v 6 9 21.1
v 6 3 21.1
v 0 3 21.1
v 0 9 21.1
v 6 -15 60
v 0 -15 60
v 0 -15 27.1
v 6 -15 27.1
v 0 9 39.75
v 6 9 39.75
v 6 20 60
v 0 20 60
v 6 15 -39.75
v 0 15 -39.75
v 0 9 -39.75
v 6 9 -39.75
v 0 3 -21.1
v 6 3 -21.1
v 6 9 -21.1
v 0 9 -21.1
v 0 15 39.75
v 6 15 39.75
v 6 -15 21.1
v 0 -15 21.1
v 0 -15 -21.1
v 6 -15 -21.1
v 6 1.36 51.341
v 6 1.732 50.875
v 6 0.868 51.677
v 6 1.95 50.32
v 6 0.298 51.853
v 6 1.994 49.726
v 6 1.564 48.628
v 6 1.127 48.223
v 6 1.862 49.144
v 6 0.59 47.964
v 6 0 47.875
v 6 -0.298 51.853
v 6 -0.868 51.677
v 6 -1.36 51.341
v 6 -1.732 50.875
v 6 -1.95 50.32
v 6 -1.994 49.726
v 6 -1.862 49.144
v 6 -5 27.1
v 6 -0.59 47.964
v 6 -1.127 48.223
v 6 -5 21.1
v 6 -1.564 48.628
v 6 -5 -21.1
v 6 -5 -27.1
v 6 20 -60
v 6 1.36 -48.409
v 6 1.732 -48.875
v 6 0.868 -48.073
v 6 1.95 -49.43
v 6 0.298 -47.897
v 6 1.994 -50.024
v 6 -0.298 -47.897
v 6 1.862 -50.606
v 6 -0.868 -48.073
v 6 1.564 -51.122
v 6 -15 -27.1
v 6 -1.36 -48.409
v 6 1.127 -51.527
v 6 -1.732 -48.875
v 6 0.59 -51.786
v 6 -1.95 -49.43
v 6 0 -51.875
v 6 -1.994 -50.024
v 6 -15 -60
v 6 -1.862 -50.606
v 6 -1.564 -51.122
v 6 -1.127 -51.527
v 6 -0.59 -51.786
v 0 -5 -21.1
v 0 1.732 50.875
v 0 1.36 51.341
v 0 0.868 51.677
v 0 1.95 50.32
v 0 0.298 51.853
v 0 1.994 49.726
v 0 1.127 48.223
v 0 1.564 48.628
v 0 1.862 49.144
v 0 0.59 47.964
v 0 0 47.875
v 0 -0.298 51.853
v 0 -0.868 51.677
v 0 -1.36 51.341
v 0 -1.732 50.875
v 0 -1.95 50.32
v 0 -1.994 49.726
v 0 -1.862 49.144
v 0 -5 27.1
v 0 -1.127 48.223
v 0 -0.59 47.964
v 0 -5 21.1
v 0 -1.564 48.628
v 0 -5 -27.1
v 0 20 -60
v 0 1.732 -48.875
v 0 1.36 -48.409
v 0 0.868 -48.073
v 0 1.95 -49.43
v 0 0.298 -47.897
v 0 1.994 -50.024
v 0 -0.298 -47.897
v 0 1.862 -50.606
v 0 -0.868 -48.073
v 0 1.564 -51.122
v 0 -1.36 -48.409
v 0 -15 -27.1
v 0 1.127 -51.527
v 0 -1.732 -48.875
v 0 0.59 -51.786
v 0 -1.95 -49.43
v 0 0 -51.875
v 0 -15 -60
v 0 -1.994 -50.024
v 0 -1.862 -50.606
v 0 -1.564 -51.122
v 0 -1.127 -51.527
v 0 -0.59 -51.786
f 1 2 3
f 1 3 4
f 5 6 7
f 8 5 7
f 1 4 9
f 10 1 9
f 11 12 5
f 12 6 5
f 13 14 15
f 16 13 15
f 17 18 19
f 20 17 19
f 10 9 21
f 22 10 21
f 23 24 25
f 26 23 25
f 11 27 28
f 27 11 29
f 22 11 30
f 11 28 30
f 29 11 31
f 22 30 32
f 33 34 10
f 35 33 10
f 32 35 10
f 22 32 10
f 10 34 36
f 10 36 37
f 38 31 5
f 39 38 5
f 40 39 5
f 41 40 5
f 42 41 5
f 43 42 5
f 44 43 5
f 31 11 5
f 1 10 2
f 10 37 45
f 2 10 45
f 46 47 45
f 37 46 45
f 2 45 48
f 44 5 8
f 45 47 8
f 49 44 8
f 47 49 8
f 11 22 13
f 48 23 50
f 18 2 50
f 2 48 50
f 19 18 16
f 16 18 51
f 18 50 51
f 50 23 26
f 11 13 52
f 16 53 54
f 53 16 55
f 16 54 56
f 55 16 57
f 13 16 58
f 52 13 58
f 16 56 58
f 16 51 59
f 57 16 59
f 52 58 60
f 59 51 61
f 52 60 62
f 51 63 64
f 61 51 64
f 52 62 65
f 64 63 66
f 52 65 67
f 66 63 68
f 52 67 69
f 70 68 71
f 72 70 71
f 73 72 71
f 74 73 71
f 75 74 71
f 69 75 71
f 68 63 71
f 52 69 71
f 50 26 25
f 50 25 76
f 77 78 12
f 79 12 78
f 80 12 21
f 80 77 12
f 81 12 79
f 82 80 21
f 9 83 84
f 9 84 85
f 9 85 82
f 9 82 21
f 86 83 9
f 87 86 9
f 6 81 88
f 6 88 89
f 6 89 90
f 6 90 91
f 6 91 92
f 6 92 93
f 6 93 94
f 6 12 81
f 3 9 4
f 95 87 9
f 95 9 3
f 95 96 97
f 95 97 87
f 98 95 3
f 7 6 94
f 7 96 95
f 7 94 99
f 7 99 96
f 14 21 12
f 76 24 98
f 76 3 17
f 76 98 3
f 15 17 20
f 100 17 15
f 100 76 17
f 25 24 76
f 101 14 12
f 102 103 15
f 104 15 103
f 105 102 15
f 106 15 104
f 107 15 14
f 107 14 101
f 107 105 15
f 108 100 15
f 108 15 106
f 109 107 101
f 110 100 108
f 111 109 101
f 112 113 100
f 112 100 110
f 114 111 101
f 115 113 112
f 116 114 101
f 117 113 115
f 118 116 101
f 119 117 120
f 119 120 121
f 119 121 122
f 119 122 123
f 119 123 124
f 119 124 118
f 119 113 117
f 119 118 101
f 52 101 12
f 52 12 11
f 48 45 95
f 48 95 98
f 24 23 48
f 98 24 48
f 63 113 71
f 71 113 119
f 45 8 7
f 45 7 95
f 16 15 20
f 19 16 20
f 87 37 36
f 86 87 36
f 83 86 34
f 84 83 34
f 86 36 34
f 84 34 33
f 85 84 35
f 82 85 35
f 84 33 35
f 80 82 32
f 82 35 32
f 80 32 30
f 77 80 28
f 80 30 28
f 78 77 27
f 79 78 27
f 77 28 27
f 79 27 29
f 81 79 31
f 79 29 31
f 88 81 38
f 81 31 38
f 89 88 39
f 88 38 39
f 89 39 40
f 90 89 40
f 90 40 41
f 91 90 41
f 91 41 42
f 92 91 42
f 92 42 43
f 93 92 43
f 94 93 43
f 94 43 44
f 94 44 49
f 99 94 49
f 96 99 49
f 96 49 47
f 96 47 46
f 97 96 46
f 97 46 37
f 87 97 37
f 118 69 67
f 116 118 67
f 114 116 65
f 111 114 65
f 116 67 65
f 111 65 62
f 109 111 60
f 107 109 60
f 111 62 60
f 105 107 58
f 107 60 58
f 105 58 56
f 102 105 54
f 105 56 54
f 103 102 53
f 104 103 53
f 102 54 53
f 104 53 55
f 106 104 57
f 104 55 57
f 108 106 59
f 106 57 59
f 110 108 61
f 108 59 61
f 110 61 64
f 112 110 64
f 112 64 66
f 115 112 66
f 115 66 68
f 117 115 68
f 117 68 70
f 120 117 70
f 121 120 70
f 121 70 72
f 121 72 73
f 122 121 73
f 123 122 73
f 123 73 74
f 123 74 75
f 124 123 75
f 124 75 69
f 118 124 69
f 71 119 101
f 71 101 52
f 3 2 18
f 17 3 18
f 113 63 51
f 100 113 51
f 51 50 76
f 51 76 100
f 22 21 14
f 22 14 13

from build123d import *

# Parameters (mm, degrees)
BOSS_EXTRUDE1_DEPTH = 6
SKETCH2_R           = 2
CUT_EXTRUDE1_DEPTH  = 10
SKETCH3_W           = 6
SKETCH3_H           = 120
BOSS_EXTRUDE2_DEPTH = 5
SKETCH4_W           = 6
SKETCH4_H           = 10
CUT_EXTRUDE2_DEPTH  = 6
SKETCH5_W           = 42.2
SKETCH5_H           = 6
CUT_EXTRUDE3_DEPTH  = 7


with BuildPart() as part:
    # Sketch1 → Boss-Extrude1 (new body)
    with BuildSketch(Plane(origin=(0, 0, 0), x_dir=(0, 0, -1), z_dir=(1, 0, 0))):
        Polygon((39.75, 15), (39.75, 9), (-39.75, 9), (-39.75, 15), (-60, 15), (-60, -15), (60, -15), (60, 15), align=None)
    extrude(amount=BOSS_EXTRUDE1_DEPTH)

    # Sketch2 → Cut-Extrude1 (cut)
    with BuildSketch(Plane(origin=(6, 0, 0), x_dir=(0, 0, -1), z_dir=(1, 0, 0))):
        with Locations((-49.875, 0)):
            Circle(SKETCH2_R)
        with Locations((49.875, 0)):
            Circle(SKETCH2_R)
    extrude(amount=-CUT_EXTRUDE1_DEPTH, mode=Mode.SUBTRACT)

    # Sketch3 → Boss-Extrude2 (add)
    with BuildSketch(Plane(origin=(0, 15, 0), x_dir=(1, 0, 0), z_dir=(0, 1, 0))):
        with Locations((3, 0)):
            Rectangle(SKETCH3_W, SKETCH3_H)
    extrude(amount=BOSS_EXTRUDE2_DEPTH)

    # Sketch4 → Cut-Extrude2 (cut)
    with BuildSketch(Plane(origin=(6, 0, 0), x_dir=(0, 0, -1), z_dir=(1, 0, 0))):
        with Locations((-24.1, -10)):
            Rectangle(SKETCH4_W, SKETCH4_H)
        with Locations((24.1, -10)):
            Rectangle(SKETCH4_W, SKETCH4_H)
    extrude(amount=-CUT_EXTRUDE2_DEPTH, mode=Mode.SUBTRACT)

    # Sketch5 → Cut-Extrude3 (cut, through all)
    with BuildSketch(Plane(origin=(6, 0, 0), x_dir=(0, 0, -1), z_dir=(1, 0, 0))):
        with Locations((0, 6)):
            Rectangle(SKETCH5_W, SKETCH5_H)
    extrude(amount=-CUT_EXTRUDE3_DEPTH, mode=Mode.SUBTRACT)


solid = part.part
